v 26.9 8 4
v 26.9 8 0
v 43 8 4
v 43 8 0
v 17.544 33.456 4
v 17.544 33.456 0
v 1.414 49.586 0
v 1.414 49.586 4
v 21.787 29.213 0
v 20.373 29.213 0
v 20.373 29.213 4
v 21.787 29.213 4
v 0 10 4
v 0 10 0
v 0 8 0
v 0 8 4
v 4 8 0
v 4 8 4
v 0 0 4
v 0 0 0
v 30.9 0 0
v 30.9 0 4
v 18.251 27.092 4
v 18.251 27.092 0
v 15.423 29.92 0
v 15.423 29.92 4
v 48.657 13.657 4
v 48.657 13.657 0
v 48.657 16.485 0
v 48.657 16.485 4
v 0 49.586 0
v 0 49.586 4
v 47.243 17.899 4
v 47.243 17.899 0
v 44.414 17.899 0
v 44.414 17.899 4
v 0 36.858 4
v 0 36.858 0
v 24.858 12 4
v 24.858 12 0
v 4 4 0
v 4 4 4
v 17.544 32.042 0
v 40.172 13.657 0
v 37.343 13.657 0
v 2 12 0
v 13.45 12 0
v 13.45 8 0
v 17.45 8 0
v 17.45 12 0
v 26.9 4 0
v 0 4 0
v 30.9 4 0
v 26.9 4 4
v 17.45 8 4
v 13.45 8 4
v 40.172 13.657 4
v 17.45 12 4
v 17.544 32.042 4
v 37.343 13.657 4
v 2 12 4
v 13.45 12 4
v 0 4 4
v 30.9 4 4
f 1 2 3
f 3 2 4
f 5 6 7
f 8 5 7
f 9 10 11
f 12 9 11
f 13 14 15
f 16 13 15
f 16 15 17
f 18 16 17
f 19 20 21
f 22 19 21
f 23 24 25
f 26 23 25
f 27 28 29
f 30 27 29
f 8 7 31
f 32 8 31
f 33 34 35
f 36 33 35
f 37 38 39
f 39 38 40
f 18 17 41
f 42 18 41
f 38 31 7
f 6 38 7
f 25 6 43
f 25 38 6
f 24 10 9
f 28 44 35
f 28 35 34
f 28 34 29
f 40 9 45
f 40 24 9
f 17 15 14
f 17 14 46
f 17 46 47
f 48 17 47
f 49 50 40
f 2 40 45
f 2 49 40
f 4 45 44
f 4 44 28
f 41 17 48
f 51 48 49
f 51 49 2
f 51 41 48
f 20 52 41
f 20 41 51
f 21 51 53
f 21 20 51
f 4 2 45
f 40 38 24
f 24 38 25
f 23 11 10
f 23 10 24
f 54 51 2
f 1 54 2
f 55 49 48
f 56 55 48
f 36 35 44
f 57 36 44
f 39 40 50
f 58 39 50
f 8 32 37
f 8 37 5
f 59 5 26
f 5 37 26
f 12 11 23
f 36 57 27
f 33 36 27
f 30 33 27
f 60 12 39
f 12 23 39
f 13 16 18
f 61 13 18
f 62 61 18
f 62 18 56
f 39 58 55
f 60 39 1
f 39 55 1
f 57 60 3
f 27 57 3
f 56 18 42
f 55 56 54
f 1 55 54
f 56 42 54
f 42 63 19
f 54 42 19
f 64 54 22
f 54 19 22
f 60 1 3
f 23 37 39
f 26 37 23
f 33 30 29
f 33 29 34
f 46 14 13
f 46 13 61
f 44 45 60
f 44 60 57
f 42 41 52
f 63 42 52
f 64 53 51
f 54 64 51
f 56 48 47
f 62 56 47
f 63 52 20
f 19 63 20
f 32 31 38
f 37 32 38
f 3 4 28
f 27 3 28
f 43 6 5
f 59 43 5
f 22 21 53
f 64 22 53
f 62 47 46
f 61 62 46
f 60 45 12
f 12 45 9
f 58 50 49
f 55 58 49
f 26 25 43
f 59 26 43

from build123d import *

# Parameters (mm, degrees)
BOSS_EXTRUDE1_DEPTH = 4
CHAMFER1_SIZE       = 2
CHAMFER1_SIZE_2     = 1.414213562
CHAMFER2_SIZE       = 1


with BuildPart() as part:
    # Sketch1 → Boss-Extrude1 (new body)
    with BuildSketch(Plane.XY):
        Polygon((0, 4), (0, 0), (30.9, 0), (30.9, 4), (26.9, 4), (26.9, 8), (43, 8), (38.757359313, 12.242640687), (21.079689783, 29.920310217), (18.251262658, 27.091883092), (15.422835534, 29.920310217), (18.251262658, 32.748737342), (0, 51), (0, 36.857864376), (24.857864376, 12), (20.857864376, 12), (17.45, 12), (17.45, 8), (13.45, 8), (13.45, 12), (0, 12), (0, 8), (4, 8), (4, 4), align=None)
        Polygon((38.757359313, 12.242640687), (43, 8), (50.071067812, 15.071067812), (45.828427125, 19.313708499), align=None)
    extrude(amount=BOSS_EXTRUDE1_DEPTH)

    # Chamfer1
    # the kernel refuses this chamfer: 2, 1.414213562 mm, written as the material it adds along each edge
    with BuildSketch(Plane(origin=(38.757359313, 12.242640687, 0), x_dir=(-0.7262819568766827, 0.6873969152646646, 0), z_dir=(0, 0, 1))) as chamfer1_piece_1:
        Polygon((CHAMFER1_SIZE * 0.999621916911, -CHAMFER1_SIZE * 0.0274958766106), (-CHAMFER1_SIZE * 0.0274958766106, -CHAMFER1_SIZE * 0.999621916911), (0, 0), align=None)
    extrude(amount=4)
    # the kernel refuses this chamfer: 2, 1.414213562 mm, written as the material it takes off along each edge
    with BuildSketch(Plane(origin=(0, 51, -5.143365976), x_dir=(0.7262819568766843, -0.6873969152646628, 0), z_dir=(0, 0, 1))) as chamfer1_2_piece_1:
        Polygon((CHAMFER1_SIZE * 0.999621916911, -CHAMFER1_SIZE * 0.0274958766106), (CHAMFER1_SIZE_2 * 0.687396915446, -CHAMFER1_SIZE_2 * 0.726281957068), (0, 0), align=None)
    extrude(amount=14.286731952, mode=Mode.SUBTRACT)
    with BuildSketch(Plane(origin=(45.828427125, 19.313708499, -5.143365976), x_dir=(0.7262819568766831, -0.6873969152646641, 0), z_dir=(0, 0, 1)), Plane(origin=(50.071067812, 15.071067812, -5.143365976), x_dir=(-0.6873969152646642, -0.726281956876683, 0), z_dir=(0, 0, 1))) as chamfer1_2_piece_2:
        Polygon((CHAMFER1_SIZE * 0.999621916911, -CHAMFER1_SIZE * 0.0274958766106), (-CHAMFER1_SIZE * 0.0274958766106, -CHAMFER1_SIZE * 0.999621916911), (0, 0), align=None)
    extrude(amount=14.286731952, mode=Mode.SUBTRACT)
    with BuildSketch(Plane(origin=(0, 12, -5.143365976), x_dir=(-0.027495876610586365, -0.9996219169112968, 0), z_dir=(0, 0, 1))) as chamfer1_2_piece_3:
        Polygon((CHAMFER1_SIZE * 0.999621916911, CHAMFER1_SIZE * 0.0274958766106), (-CHAMFER1_SIZE * 0.0274958766106, CHAMFER1_SIZE * 0.999621916911), (0, 0), align=None)
    extrude(amount=14.286731952, mode=Mode.SUBTRACT)

    # Chamfer2
    chamfer2_edges = [part.edges().sort_by_distance(p)[0] for p in [
        (18.251262658, 32.748737342, 2),
        (21.079689783, 29.920310217, 2),
    ]]
    chamfer(chamfer2_edges, length=CHAMFER2_SIZE)


solid = part.part
